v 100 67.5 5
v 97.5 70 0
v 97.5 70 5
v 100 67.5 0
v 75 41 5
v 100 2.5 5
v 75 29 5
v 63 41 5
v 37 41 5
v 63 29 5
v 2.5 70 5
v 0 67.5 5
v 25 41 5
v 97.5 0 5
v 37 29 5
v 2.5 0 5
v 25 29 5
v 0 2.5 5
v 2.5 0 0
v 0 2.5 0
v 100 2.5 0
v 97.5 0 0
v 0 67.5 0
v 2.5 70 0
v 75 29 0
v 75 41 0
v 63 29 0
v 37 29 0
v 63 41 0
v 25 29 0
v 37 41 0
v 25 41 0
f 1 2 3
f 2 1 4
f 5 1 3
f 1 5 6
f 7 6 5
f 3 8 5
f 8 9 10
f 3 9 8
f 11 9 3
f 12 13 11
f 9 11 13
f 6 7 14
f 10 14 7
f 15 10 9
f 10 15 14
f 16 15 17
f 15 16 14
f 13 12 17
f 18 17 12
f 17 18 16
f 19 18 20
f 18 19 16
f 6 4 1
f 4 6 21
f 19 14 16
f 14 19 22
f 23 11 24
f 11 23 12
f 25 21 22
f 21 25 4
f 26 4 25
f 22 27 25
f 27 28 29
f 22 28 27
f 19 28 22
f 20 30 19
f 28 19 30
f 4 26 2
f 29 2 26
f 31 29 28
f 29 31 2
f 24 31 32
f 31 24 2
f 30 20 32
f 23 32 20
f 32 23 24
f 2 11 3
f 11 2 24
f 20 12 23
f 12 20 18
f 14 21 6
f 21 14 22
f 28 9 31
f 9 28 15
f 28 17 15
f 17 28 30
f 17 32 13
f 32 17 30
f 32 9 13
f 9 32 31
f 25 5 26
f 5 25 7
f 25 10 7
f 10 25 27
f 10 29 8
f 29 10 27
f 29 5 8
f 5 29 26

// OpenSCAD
$fn = 32;

// ----------------------------------------------------------------------
// Windowed plate: 2 voids, 100 x 70 x 5 mm
// ----------------------------------------------------------------------

// --- parameters (mm) ---
plate_l = 100;            // plate length, X
plate_w = 70;             // plate width, Y
plate_t = 5;              // plate thickness, Z
edge_margin = 12;         // wall from the plate edge to any window
windows = 2;              // number of windows in the row
win_l = 12;               // window length
win_w = 12;               // window width
win_pitch = 38;           // window pitch along X
depth_1 = 5;              // depth of void 1 (full thickness = through)
depth_2 = 5;              // depth of void 2 (full thickness = through)
corner_c = 2.5;           // corner chamfer of the plate

profile = [[2.5, 0], [97.5, 0], [100, 2.5], [100, 67.5], [97.5, 70], [2.5, 70], [0, 67.5], [0, 2.5]];  // primary outline, 8 points, counter clockwise
void_1 = [[25, 29], [37, 29], [37, 41], [25, 41]];  // window 1 of the row, 4 points
void_2 = [[63, 29], [75, 29], [75, 41], [63, 41]];  // window 2 of the row, 4 points

// --- the one profile operation ---
difference() {
  linear_extrude(height = plate_t) polygon(points = profile);
  translate([0, 0, -1])
    linear_extrude(height = plate_t + 2) polygon(points = void_1);
  translate([0, 0, -1])
    linear_extrude(height = plate_t + 2) polygon(points = void_2);
}
